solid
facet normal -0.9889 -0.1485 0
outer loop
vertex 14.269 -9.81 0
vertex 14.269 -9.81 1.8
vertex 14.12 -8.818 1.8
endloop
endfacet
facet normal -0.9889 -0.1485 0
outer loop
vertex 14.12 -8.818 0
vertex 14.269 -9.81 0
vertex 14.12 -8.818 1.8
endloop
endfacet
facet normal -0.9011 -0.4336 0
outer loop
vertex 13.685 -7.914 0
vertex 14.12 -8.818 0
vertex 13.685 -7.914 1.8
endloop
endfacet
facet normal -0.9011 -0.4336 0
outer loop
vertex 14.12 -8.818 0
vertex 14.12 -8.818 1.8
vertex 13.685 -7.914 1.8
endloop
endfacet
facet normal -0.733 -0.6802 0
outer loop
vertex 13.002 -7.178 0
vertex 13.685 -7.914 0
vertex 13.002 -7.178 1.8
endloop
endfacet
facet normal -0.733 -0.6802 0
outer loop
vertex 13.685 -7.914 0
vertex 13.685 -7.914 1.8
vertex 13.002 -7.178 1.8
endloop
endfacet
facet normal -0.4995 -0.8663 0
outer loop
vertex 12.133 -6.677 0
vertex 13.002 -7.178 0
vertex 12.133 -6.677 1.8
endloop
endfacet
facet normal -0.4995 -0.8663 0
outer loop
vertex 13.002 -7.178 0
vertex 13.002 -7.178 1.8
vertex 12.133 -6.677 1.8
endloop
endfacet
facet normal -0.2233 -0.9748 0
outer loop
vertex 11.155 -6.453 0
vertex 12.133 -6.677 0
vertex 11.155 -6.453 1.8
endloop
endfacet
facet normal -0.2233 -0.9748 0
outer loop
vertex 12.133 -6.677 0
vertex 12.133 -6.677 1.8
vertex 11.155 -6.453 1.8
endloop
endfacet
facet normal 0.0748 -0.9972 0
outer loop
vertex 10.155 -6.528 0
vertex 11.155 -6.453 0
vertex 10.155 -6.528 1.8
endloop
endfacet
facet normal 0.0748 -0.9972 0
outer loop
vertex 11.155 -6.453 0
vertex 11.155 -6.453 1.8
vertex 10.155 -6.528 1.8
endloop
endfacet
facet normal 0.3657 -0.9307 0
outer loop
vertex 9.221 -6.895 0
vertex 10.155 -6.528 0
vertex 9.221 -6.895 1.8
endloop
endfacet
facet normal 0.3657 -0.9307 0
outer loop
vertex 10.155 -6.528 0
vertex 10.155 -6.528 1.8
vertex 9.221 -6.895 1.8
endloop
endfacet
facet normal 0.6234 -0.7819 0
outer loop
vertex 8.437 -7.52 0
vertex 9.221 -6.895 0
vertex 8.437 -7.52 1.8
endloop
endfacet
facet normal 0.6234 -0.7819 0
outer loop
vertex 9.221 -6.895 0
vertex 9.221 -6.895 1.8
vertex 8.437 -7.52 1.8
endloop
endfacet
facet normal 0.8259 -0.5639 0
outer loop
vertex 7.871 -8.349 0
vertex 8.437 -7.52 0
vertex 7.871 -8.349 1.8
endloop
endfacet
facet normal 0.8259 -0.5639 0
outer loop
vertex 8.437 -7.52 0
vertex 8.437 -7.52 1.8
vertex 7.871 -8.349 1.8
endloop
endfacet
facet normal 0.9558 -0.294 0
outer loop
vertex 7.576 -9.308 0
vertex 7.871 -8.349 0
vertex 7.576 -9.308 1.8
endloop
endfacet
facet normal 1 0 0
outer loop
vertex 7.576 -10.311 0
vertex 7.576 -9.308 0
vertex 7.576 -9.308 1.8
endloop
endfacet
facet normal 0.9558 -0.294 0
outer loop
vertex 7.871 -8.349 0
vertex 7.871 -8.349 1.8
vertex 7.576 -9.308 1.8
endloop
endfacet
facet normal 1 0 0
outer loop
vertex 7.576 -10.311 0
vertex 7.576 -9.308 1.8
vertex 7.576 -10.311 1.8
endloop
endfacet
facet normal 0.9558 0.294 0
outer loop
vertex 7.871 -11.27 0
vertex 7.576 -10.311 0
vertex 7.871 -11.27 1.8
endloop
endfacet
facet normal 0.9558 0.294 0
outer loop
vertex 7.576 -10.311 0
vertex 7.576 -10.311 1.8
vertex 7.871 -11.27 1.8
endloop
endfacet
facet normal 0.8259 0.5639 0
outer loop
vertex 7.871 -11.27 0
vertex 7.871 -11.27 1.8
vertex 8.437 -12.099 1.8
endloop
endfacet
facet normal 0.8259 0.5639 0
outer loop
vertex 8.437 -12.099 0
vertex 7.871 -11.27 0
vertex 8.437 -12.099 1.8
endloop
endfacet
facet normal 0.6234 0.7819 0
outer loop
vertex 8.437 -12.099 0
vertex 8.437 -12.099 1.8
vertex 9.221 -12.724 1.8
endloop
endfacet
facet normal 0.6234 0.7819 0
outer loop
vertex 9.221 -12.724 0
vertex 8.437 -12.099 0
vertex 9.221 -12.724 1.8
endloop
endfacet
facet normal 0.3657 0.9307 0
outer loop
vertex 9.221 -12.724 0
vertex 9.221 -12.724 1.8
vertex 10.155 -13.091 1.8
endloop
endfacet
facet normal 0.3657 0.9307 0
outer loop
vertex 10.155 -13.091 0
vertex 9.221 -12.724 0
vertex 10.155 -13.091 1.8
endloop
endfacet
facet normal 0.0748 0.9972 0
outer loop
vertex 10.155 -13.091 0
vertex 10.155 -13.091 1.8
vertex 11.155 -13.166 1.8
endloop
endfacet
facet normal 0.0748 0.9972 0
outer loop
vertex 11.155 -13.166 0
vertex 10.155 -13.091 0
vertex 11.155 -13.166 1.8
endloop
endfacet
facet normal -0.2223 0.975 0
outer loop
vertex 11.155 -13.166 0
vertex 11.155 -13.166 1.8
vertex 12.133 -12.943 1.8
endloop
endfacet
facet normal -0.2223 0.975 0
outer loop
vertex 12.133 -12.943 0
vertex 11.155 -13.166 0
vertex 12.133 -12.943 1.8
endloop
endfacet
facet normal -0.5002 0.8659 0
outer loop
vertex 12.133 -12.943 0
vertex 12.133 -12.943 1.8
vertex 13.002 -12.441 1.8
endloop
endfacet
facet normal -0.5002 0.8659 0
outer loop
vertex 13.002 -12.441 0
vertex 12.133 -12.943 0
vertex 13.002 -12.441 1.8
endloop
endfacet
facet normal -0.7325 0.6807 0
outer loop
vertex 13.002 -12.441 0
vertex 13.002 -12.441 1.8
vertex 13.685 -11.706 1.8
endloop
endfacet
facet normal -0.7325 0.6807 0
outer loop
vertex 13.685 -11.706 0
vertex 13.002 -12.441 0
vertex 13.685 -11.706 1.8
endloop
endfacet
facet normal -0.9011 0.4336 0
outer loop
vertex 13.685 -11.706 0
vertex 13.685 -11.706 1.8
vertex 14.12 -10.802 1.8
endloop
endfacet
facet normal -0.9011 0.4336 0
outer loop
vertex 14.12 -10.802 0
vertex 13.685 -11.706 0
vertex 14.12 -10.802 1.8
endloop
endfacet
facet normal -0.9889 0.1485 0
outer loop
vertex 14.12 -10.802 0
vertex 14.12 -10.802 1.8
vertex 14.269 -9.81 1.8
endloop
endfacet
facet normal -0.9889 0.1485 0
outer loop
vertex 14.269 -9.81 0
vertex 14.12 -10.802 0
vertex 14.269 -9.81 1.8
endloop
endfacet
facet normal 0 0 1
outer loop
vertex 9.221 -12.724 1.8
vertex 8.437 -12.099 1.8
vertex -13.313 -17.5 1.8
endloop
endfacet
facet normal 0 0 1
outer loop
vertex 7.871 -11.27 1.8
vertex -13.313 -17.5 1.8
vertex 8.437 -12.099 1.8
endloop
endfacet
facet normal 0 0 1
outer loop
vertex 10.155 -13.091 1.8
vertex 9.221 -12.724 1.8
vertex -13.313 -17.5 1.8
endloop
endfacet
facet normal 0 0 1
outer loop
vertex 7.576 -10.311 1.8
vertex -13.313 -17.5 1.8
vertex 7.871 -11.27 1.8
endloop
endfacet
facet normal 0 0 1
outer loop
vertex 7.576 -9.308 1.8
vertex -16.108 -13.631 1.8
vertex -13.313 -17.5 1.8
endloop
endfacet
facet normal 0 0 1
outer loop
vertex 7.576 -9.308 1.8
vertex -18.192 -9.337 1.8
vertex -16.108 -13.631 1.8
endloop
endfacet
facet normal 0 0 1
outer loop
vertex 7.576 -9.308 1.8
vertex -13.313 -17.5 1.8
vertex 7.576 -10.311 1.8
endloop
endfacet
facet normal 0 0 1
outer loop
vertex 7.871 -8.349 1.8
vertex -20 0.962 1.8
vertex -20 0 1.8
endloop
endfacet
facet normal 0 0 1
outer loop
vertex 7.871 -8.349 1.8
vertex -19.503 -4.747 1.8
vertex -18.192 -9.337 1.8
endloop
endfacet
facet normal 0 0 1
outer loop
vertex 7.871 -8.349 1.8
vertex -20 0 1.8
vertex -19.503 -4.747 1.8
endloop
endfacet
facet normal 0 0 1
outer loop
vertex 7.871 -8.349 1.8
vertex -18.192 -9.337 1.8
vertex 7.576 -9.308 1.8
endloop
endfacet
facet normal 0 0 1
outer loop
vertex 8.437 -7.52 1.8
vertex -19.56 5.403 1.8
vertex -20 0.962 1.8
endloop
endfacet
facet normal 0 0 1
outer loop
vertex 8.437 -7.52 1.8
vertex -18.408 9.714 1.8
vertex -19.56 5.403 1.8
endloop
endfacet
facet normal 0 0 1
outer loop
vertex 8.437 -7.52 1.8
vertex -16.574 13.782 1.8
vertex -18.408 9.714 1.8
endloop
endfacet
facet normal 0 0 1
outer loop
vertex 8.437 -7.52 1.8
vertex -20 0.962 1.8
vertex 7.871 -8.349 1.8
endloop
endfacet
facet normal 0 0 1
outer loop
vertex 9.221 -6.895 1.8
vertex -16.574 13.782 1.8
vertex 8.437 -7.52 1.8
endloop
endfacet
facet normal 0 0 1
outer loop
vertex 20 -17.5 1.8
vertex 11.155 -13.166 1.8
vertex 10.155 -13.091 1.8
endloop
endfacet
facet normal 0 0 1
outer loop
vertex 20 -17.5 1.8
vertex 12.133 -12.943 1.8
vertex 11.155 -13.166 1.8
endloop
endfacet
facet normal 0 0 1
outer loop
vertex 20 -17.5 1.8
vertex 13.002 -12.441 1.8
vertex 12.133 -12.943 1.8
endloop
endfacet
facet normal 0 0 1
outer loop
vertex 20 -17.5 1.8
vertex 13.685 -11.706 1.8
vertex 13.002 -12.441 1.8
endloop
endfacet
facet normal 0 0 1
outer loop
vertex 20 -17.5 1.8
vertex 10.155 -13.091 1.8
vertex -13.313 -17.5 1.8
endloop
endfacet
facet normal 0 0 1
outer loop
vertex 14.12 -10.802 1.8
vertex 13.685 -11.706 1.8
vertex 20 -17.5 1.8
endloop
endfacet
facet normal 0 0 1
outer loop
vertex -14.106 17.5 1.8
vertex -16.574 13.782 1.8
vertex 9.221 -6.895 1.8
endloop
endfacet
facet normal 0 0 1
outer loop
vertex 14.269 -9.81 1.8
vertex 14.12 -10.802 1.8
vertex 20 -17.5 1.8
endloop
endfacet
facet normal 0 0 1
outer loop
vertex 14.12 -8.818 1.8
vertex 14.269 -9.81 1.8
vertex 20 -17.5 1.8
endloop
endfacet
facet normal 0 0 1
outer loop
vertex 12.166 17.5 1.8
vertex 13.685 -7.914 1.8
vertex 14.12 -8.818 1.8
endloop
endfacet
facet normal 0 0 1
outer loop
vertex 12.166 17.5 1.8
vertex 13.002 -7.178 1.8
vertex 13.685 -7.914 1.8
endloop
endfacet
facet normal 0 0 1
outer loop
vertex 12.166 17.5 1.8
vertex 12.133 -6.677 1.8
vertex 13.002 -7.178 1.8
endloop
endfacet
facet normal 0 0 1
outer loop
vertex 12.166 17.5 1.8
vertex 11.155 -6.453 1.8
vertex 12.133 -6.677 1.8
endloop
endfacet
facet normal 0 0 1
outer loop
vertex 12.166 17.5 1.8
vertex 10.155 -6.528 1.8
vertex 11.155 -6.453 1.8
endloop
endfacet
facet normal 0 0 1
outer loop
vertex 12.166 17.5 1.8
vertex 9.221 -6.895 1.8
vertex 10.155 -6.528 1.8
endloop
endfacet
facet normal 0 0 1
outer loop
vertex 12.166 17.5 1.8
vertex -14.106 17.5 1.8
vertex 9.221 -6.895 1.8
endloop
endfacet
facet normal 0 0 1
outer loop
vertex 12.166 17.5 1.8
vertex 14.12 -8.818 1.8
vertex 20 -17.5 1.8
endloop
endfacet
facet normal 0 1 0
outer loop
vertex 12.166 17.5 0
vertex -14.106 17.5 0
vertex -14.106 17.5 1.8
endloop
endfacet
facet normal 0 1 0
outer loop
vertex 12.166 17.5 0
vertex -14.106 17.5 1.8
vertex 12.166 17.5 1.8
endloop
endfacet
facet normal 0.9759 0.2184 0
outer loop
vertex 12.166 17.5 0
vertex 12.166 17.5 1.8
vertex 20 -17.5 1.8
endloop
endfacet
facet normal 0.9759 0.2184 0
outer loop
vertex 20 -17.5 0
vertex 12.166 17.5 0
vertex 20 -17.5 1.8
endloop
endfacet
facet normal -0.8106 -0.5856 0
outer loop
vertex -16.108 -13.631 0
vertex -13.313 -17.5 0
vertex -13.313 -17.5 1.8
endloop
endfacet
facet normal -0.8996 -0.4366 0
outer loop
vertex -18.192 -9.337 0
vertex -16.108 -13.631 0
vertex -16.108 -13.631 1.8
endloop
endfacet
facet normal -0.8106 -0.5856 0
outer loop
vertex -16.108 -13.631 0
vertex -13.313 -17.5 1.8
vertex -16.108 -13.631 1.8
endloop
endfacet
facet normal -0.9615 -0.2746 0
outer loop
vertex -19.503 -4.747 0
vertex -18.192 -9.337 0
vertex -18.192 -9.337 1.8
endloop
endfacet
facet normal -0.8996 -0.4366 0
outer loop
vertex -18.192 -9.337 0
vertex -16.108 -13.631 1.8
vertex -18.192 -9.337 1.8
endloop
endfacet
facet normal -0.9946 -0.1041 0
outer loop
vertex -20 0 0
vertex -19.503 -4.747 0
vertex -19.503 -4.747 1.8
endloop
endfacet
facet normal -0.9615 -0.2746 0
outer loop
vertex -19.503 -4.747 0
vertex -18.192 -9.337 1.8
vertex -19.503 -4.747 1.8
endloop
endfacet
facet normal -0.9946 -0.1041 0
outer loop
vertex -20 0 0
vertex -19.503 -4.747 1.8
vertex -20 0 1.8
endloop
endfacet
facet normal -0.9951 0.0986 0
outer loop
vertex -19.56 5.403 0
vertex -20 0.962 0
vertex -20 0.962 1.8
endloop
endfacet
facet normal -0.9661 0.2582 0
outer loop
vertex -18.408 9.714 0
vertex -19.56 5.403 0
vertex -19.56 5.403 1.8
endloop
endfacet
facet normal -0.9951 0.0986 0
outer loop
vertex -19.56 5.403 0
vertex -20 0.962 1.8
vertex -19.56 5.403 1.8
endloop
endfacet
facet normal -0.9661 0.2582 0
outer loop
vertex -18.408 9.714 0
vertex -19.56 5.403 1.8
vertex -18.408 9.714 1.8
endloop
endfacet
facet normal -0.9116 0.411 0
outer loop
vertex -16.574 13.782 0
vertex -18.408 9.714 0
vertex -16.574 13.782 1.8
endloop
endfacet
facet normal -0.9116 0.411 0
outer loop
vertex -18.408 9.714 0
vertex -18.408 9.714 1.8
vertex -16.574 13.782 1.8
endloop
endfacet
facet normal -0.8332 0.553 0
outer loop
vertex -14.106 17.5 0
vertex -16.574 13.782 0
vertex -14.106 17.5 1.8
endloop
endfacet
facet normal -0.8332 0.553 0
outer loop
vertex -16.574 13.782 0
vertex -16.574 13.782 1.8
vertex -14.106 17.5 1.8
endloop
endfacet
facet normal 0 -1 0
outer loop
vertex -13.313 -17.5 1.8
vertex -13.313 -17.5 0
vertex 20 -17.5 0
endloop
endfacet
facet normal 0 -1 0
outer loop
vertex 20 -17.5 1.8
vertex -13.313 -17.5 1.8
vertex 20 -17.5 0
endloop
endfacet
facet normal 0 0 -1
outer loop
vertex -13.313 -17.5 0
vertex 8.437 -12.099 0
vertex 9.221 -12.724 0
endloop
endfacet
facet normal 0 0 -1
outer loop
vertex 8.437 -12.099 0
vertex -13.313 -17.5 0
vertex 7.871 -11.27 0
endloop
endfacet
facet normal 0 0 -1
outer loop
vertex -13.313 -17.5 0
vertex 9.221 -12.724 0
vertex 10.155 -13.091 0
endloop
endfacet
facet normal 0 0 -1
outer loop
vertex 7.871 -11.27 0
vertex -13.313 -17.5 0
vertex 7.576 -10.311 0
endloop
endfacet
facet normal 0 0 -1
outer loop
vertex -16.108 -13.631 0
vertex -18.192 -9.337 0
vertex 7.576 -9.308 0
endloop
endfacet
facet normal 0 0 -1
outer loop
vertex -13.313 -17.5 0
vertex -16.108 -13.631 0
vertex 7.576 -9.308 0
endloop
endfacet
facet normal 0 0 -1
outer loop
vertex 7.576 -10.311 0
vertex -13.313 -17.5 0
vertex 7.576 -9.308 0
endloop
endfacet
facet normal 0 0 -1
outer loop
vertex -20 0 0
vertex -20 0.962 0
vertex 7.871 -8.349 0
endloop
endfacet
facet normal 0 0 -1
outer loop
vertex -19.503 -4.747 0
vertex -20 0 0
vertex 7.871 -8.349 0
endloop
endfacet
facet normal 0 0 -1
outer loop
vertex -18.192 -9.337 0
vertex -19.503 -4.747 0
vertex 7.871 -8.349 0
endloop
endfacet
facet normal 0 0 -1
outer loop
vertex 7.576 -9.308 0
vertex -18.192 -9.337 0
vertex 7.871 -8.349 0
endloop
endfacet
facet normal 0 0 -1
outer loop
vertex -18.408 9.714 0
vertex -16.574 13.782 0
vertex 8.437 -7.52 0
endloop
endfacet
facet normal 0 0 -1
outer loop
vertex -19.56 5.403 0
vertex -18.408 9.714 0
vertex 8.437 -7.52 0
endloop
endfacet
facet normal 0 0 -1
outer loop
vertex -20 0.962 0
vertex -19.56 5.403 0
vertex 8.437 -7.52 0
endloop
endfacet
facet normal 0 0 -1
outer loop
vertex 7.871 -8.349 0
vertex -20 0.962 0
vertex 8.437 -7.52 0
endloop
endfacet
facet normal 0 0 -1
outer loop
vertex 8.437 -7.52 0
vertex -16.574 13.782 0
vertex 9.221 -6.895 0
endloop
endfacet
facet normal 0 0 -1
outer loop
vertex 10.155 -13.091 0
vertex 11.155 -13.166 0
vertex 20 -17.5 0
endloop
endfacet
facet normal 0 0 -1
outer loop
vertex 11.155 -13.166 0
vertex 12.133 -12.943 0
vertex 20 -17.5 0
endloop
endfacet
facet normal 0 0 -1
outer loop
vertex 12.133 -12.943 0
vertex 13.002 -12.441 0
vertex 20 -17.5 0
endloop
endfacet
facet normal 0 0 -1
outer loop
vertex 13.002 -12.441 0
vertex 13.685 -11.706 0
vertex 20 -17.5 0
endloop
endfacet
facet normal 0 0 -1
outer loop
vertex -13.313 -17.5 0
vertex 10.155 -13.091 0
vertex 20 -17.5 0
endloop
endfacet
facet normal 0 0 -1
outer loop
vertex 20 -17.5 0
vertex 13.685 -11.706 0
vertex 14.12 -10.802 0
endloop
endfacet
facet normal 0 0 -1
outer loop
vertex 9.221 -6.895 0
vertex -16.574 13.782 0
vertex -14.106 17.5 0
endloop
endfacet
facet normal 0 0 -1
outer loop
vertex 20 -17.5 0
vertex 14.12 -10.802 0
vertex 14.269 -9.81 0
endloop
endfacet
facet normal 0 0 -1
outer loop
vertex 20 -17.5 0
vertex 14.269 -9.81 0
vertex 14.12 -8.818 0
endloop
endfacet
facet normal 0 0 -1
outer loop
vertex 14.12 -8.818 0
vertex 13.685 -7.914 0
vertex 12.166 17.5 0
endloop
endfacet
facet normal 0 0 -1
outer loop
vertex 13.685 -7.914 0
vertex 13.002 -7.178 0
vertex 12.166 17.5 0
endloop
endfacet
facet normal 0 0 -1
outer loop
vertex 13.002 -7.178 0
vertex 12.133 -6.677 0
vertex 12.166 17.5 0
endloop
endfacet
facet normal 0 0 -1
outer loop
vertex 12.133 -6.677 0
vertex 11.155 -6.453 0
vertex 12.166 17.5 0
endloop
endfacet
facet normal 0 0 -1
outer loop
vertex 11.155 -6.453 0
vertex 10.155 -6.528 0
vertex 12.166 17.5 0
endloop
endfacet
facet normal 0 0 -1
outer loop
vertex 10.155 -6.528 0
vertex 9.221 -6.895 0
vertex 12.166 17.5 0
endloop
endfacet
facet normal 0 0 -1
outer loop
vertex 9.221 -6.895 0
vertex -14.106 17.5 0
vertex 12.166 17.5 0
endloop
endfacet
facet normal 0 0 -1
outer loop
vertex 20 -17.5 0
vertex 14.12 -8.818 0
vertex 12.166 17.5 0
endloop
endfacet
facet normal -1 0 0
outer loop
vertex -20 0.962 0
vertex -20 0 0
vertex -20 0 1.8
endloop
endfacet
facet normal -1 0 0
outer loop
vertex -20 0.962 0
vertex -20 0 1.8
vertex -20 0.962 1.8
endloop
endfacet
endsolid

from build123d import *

# Parameters (mm, degrees)
F0_W     = 40
F0_H     = 35
F1_DEPTH = 1.8
F3_DEPTH = 1.801
F5_DEPTH = 1.801
F6_R     = 3.365697
F7_DEPTH = 1.801


with BuildPart() as f1:
    # F0 (on Top) → F1 (new body)
    with BuildSketch(Plane.XY):
        Rectangle(F0_W, F0_H)
    extrude(amount=F1_DEPTH)

    # F2 (on face) → F3 (cut, through all)
    with BuildSketch(Plane.XY.offset(1.8)):
        Polygon((20, 17.5), (12.16623, 17.5), (20, -17.5), align=None)
    extrude(amount=-F3_DEPTH, mode=Mode.SUBTRACT)

    # F4 (on face) → F5 (cut, through all)
    with BuildSketch(Plane.XY.offset(1.8)):
        with BuildLine():
            ThreePointArc((-13.312635, -17.5), (-18.192213, -9.33692), (-20, 0))
            Line((-20, 0), (-20, -17.5))
            Line((-20, -17.5), (-13.312635, -17.5))
        make_face()
        with BuildLine():
            ThreePointArc((-20, 0.962044), (-18.408216, 9.713903), (-14.106414, 17.5))
            Line((-14.106414, 17.5), (-20, 17.5))
            Line((-20, 17.5), (-20, 0.962044))
        make_face()
    extrude(amount=-F5_DEPTH, mode=Mode.SUBTRACT)

    # F6 (on face) → F7 (cut, through all)
    with BuildSketch(Plane.XY.offset(1.8)):
        with Locations((10.903767, -9.809669)):
            Circle(F6_R)
    extrude(amount=-F7_DEPTH, mode=Mode.SUBTRACT)


solid = f1.part
